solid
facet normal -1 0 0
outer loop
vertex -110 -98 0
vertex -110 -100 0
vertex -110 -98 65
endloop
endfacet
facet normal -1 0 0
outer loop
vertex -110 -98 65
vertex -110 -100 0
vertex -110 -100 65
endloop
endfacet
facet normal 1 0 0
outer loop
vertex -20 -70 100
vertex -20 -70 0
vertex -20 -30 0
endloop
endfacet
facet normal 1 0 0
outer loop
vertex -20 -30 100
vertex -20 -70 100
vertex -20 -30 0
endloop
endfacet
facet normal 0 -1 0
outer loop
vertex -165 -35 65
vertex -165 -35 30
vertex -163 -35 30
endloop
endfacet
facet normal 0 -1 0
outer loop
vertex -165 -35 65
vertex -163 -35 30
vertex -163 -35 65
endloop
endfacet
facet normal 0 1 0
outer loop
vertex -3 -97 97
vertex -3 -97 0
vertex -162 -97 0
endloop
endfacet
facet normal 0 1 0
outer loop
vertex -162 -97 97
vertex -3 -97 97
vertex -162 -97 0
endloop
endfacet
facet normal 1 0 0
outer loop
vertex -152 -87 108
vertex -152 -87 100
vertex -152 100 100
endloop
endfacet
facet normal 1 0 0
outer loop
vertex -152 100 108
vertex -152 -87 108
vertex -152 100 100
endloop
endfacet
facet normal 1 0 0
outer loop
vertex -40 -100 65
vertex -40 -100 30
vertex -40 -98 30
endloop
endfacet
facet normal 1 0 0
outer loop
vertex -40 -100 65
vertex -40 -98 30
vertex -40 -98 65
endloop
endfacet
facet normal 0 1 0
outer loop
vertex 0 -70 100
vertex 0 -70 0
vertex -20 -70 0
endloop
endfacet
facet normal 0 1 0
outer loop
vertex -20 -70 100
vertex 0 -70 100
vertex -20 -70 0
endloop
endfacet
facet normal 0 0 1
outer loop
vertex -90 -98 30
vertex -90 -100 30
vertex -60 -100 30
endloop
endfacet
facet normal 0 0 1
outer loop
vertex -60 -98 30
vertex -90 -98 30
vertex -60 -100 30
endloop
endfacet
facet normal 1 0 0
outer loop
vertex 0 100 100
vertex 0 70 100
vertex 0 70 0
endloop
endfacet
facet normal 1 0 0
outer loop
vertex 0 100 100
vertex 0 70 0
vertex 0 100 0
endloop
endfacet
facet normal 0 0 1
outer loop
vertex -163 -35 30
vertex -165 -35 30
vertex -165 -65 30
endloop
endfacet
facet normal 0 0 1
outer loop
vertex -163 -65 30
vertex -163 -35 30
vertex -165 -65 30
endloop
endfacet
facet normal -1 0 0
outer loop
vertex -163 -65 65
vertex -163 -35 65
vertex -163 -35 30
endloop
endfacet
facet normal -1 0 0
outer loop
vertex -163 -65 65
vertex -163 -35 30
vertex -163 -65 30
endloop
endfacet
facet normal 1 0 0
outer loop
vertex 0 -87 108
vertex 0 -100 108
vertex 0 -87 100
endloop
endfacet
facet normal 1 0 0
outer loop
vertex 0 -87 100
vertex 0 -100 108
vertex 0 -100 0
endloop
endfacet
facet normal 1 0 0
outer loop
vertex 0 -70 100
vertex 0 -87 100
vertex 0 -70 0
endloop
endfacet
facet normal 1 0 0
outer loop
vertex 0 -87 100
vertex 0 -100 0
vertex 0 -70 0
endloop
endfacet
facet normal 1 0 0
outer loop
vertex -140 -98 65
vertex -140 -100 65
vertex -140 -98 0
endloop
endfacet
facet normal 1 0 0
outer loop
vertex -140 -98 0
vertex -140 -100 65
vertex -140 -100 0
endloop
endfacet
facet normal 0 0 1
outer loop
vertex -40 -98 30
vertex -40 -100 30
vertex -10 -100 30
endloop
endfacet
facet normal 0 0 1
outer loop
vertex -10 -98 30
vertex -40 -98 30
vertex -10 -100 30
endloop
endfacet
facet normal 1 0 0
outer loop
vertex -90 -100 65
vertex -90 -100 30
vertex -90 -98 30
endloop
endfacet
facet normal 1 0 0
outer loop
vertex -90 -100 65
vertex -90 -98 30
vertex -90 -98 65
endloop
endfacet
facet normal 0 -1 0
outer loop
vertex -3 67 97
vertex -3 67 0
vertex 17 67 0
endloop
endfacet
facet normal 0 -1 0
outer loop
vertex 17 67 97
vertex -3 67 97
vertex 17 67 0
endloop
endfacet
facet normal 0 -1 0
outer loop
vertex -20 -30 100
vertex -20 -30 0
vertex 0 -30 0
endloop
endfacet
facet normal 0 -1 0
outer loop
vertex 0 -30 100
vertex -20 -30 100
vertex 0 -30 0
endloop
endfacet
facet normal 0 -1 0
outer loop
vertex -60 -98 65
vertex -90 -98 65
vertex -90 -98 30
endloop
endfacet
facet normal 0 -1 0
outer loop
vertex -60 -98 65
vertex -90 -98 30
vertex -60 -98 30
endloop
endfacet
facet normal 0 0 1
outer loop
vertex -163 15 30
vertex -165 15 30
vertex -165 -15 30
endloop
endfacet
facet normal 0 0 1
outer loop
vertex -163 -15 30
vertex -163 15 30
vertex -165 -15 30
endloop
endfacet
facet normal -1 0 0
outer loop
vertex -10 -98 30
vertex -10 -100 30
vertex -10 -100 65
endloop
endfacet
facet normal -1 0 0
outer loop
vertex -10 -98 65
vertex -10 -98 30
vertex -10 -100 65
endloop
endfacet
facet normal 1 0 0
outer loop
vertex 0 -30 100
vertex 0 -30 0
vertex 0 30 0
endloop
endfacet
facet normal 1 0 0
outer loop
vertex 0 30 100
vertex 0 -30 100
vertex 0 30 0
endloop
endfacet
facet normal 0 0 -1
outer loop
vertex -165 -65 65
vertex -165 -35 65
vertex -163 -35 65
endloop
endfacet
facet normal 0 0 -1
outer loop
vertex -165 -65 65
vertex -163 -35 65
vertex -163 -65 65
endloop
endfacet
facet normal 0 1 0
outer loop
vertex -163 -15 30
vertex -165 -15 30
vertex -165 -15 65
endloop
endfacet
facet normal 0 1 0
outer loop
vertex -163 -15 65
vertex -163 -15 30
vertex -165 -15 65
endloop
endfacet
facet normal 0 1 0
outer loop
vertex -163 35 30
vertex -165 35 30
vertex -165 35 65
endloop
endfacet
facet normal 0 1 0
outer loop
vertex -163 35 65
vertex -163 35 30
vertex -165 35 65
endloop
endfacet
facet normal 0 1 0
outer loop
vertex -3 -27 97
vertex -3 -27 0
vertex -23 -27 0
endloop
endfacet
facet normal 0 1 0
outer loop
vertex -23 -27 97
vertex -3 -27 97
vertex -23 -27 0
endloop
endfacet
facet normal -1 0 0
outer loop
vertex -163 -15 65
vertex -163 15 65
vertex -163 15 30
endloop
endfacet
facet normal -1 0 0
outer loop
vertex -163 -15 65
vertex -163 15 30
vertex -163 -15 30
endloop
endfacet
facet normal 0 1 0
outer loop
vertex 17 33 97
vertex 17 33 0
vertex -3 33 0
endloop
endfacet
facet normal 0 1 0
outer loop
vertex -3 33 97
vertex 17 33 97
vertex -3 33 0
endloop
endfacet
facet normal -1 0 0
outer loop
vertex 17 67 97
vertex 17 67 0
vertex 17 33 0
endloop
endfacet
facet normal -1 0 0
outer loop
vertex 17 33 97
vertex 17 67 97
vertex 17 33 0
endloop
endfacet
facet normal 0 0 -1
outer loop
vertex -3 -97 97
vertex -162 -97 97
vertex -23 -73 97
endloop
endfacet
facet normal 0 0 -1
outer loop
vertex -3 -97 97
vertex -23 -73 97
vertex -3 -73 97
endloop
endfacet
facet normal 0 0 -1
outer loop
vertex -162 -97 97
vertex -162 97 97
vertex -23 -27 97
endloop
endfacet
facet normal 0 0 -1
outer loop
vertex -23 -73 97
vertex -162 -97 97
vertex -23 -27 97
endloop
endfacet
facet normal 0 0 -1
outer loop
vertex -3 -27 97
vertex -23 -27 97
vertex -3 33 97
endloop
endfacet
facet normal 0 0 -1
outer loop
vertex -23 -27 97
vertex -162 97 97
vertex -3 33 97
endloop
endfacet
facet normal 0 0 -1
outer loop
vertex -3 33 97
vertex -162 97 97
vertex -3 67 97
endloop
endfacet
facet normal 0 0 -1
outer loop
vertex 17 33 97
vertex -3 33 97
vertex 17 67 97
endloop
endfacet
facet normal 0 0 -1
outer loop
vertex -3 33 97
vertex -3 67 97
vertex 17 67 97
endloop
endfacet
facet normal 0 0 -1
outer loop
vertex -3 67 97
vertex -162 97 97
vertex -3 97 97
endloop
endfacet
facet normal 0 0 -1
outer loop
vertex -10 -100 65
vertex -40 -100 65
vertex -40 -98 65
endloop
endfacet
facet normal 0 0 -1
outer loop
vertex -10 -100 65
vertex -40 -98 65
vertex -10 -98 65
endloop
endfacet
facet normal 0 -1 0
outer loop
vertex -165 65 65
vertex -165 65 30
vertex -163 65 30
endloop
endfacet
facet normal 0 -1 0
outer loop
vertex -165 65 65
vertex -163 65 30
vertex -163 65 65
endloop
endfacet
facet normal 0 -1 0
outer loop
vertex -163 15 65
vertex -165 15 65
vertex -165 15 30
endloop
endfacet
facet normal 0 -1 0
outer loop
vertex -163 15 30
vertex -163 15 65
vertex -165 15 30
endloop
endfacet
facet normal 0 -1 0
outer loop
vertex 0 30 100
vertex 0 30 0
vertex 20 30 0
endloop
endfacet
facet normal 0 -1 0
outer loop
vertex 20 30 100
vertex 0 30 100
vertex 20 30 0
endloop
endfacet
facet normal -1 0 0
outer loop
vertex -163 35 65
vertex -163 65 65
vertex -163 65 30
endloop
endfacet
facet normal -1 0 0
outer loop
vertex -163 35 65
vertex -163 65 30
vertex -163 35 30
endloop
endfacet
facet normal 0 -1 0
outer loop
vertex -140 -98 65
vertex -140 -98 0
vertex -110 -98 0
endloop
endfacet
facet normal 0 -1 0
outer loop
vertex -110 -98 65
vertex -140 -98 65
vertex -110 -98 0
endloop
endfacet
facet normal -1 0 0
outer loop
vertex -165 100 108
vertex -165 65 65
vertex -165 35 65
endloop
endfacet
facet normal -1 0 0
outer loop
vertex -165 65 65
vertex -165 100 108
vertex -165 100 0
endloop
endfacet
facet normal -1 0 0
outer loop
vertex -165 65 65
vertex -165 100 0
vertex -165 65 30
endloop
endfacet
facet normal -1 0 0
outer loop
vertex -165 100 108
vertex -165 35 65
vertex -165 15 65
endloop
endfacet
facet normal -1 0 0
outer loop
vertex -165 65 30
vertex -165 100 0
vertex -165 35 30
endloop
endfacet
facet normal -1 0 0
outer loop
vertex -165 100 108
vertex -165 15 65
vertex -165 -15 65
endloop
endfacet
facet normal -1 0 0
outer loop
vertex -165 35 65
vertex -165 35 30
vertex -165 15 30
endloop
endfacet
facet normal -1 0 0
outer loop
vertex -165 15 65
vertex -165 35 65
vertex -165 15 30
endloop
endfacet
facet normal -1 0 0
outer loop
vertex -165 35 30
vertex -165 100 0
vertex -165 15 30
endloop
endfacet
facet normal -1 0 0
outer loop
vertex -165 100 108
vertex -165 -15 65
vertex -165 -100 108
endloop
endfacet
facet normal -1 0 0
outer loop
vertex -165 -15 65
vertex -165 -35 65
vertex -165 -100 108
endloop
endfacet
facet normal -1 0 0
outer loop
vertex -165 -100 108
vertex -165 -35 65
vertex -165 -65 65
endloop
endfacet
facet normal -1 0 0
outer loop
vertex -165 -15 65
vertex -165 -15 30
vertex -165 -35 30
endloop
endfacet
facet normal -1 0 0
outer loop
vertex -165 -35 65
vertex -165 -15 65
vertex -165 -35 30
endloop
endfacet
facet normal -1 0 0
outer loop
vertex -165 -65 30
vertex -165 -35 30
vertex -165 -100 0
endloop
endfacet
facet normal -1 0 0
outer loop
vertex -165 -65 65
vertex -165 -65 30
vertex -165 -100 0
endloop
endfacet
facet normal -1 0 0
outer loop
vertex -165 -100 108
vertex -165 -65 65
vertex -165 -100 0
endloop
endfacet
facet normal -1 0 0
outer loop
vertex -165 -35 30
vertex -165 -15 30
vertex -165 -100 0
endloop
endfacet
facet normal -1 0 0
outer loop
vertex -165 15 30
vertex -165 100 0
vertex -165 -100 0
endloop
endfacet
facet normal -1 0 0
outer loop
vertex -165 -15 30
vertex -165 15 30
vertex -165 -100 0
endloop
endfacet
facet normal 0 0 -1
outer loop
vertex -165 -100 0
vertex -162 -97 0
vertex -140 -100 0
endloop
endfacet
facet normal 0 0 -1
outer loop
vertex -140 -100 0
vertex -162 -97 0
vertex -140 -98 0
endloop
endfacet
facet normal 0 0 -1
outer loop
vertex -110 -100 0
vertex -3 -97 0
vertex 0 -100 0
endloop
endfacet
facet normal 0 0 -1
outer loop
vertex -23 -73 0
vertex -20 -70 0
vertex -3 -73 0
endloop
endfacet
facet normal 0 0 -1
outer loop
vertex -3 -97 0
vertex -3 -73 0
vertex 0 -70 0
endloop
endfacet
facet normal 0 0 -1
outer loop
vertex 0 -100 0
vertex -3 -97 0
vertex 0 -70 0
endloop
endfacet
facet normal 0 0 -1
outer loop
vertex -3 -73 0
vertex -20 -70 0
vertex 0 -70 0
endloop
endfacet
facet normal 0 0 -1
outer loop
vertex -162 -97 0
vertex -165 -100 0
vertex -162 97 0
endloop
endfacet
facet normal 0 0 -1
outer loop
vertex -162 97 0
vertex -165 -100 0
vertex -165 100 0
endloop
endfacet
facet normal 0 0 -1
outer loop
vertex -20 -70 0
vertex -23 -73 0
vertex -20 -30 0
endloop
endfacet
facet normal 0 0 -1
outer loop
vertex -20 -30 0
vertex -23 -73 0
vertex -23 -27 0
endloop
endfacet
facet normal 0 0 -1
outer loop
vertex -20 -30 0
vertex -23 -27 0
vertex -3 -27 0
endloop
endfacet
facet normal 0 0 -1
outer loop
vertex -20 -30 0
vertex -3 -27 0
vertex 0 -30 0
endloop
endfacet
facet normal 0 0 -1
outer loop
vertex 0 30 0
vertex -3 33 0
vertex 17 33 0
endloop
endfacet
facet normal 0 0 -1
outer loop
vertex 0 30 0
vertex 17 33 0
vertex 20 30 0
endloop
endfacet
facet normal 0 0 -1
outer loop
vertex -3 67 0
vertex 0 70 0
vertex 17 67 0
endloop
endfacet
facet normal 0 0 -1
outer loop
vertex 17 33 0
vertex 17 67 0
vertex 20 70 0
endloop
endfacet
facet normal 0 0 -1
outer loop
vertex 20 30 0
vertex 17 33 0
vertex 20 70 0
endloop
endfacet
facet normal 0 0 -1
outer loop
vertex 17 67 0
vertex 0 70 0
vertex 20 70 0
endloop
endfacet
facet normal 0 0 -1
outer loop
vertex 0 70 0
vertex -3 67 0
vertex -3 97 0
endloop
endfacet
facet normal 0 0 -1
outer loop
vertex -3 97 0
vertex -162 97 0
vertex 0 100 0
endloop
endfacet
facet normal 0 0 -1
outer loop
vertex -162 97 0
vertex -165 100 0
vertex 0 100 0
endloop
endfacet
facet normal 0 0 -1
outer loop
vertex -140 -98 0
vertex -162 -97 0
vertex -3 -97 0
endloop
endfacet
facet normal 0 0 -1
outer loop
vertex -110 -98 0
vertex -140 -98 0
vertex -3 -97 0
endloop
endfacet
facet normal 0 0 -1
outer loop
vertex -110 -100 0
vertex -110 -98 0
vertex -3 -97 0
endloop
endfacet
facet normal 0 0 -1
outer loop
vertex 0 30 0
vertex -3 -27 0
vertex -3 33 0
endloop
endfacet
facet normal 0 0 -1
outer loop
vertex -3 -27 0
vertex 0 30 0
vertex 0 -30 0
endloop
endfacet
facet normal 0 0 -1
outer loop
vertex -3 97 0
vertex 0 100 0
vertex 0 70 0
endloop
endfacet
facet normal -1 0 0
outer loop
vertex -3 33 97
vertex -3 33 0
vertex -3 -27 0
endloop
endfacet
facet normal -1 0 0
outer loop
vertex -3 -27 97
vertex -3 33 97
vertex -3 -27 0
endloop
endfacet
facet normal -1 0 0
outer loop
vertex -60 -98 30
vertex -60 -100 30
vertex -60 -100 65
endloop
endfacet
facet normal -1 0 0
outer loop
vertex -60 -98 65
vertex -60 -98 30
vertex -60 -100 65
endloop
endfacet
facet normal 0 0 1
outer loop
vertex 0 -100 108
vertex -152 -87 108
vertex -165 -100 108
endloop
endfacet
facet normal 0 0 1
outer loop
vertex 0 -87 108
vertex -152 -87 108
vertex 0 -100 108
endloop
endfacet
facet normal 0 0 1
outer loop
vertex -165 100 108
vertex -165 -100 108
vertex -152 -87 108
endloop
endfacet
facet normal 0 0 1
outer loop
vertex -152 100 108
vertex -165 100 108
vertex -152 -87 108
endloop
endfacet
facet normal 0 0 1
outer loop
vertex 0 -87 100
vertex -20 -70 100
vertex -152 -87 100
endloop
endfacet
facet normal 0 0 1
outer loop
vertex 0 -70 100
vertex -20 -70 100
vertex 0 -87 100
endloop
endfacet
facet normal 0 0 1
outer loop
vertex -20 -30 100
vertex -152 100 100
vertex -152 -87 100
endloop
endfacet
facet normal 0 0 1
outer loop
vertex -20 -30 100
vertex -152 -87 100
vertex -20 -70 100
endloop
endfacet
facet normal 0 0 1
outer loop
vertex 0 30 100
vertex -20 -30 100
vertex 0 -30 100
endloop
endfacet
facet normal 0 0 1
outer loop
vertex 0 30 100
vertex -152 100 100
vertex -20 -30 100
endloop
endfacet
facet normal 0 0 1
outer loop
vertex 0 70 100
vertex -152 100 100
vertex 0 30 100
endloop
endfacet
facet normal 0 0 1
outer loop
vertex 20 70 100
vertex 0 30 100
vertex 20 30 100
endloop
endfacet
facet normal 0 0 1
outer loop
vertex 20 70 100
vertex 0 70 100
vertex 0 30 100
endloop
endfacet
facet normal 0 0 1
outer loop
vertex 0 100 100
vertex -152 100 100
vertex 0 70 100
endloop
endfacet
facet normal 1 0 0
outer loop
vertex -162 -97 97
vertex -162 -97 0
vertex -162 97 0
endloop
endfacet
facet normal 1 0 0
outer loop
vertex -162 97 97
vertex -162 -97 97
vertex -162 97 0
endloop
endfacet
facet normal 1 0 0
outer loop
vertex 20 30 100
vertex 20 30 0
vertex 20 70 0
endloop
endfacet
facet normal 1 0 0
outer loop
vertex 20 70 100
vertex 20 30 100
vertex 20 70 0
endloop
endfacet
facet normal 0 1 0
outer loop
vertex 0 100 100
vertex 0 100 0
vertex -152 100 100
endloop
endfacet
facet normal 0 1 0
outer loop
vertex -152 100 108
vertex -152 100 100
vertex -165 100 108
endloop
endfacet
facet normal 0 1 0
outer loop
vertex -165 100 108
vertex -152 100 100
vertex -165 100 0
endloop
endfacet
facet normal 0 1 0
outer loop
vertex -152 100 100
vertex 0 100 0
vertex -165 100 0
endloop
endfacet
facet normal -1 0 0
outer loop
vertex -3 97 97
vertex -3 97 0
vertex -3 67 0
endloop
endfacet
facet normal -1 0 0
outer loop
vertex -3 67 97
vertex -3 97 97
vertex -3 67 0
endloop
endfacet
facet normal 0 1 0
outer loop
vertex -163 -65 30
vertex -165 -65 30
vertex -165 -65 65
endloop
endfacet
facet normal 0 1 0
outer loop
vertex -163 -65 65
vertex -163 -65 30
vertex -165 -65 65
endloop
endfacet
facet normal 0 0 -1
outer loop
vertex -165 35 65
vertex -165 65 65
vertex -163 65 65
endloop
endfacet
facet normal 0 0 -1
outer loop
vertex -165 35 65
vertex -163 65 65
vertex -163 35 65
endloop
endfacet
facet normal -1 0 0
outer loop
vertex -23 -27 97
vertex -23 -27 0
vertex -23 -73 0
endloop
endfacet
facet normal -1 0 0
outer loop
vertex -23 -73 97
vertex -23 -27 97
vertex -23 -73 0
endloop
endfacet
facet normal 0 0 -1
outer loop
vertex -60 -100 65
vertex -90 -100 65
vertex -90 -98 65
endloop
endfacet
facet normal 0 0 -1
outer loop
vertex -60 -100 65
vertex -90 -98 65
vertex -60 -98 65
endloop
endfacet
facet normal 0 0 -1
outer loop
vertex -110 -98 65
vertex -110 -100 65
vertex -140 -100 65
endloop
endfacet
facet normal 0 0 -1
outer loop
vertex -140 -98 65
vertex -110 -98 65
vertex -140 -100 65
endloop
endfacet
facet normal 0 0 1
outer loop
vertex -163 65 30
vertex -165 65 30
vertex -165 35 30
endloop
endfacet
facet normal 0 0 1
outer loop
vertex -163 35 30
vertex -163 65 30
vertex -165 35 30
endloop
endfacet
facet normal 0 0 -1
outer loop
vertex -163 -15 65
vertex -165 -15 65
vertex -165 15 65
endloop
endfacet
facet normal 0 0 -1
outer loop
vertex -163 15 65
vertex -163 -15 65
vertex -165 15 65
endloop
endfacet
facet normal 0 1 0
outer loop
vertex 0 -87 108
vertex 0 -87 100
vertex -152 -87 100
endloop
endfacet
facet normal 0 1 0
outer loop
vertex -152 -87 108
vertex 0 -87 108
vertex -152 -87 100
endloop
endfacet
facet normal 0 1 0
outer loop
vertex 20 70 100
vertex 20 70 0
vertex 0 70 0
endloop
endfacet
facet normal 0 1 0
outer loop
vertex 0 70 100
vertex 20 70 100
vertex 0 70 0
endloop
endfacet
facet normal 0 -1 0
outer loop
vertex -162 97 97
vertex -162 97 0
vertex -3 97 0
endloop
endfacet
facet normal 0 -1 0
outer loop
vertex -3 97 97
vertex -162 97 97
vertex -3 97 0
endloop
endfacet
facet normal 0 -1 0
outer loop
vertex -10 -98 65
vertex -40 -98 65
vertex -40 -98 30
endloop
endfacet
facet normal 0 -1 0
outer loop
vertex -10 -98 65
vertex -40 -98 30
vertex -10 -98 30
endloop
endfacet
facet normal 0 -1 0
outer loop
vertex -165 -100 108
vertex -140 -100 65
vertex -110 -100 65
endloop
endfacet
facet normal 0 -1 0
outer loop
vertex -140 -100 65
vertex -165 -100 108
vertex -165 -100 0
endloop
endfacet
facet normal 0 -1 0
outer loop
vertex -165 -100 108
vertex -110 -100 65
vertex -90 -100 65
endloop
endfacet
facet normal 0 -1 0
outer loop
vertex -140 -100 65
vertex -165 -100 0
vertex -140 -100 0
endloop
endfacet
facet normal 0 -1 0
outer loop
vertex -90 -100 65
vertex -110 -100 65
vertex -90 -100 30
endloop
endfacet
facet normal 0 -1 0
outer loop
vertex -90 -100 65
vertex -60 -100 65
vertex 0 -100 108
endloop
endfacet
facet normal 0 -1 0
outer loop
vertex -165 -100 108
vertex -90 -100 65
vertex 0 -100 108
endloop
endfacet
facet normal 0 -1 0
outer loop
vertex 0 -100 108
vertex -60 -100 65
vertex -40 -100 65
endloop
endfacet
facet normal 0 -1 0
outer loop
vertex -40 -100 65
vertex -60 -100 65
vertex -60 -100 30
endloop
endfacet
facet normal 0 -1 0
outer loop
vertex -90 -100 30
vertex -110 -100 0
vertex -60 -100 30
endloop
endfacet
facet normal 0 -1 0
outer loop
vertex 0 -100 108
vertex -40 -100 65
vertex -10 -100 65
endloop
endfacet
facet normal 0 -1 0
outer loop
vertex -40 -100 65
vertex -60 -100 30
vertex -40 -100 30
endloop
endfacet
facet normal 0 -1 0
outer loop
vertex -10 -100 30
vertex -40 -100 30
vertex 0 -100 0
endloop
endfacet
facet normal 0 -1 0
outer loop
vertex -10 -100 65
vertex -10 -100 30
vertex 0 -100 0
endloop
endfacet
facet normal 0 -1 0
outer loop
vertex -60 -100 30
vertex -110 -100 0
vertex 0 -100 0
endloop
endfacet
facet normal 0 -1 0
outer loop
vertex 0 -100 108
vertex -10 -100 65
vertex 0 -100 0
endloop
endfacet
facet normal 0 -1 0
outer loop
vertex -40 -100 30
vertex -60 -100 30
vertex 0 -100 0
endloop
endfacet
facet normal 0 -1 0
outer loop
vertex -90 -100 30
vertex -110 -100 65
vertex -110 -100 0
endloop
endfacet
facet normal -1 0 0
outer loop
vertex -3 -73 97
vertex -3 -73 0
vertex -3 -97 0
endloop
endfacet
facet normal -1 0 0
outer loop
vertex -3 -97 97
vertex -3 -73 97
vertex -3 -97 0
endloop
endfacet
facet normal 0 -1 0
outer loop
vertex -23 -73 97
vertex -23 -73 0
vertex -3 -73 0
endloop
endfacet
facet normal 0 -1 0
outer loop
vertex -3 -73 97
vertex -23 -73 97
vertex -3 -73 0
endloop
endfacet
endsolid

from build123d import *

# Parameters (mm, degrees)
F1_DEPTH = 100
F3_DEPTH = 3
F5_DEPTH = 8
F6_W     = 30
F6_H     = 35
F7_DEPTH = 2
F8_W     = 30
F8_H     = 35
F9_DEPTH = 2


with BuildPart() as f1:
    # F0 (on Top) → F1 (new body)
    with BuildSketch(Plane.XY):
        Polygon((-165, -100), (0, -100), (0, -70), (-20, -70), (-20, -30), (0, -30), (0, 30), (20, 30), (20, 70), (0, 70), (0, 100), (-165, 100), align=None)
        Polygon((-2.999997, -97.000003), (-162.000003, -97.000003), (-162.000003, 97.000003), (-2.999997, 97.000003), (-2.999997, 67.000003), (17.000003, 67.000003), (17.000003, 32.999997), (-2.999997, 32.999997), (-2.999997, -27.000003), (-22.999997, -27.000003), (-22.999997, -72.999997), (-2.999997, -72.999997), align=None, mode=Mode.SUBTRACT)
    extrude(amount=F1_DEPTH)

    # F2 (on face) → F3 (join)
    with BuildSketch(Plane.XY.offset(100)):
        Polygon((-165, 100), (-165, -100), (0, -100), (0, -70), (-20, -70), (-20, -30), (0, -30), (0, 30), (20, 30), (20, 70), (0, 70), (0, 100), align=None)
    extrude(amount=-F3_DEPTH)

    # F4 (on face) → F5 (join)
    with BuildSketch(Plane.XY.offset(100)):
        Polygon((-152, -100), (0, -100), (0, -87), (-152, -87), (-152, 100), (-165, 100), (-165, -100), (-162, -100), align=None)
    extrude(amount=F5_DEPTH)

    # F6 (on face) → F7 (cut)
    with BuildSketch(Plane.XZ.offset(100)):
        with Locations((-25, 47.5)):
            Rectangle(F6_W, F6_H)
        with Locations((-75, 47.5)):
            Rectangle(F6_W, F6_H)
        Polygon((-110, 30), (-110, 65), (-140, 65), (-140, 30), (-140, 0), (-110, 0), align=None)
    extrude(amount=-F7_DEPTH, mode=Mode.SUBTRACT)

    # F8 (on face) → F9 (cut)
    with BuildSketch(Plane(origin=(-165, 0, 0), x_dir=(0, -1, 0), z_dir=(-1, 0, 0))):
        Polygon((-15, 65), (-15, 30), (0, 30), (15, 30), (15, 65), align=None)
        with Locations((50, 47.5)):
            Rectangle(F8_W, F8_H)
        with Locations((-50, 47.5)):
            Rectangle(F8_W, F8_H)
    extrude(amount=-F9_DEPTH, mode=Mode.SUBTRACT)


solid = f1.part
